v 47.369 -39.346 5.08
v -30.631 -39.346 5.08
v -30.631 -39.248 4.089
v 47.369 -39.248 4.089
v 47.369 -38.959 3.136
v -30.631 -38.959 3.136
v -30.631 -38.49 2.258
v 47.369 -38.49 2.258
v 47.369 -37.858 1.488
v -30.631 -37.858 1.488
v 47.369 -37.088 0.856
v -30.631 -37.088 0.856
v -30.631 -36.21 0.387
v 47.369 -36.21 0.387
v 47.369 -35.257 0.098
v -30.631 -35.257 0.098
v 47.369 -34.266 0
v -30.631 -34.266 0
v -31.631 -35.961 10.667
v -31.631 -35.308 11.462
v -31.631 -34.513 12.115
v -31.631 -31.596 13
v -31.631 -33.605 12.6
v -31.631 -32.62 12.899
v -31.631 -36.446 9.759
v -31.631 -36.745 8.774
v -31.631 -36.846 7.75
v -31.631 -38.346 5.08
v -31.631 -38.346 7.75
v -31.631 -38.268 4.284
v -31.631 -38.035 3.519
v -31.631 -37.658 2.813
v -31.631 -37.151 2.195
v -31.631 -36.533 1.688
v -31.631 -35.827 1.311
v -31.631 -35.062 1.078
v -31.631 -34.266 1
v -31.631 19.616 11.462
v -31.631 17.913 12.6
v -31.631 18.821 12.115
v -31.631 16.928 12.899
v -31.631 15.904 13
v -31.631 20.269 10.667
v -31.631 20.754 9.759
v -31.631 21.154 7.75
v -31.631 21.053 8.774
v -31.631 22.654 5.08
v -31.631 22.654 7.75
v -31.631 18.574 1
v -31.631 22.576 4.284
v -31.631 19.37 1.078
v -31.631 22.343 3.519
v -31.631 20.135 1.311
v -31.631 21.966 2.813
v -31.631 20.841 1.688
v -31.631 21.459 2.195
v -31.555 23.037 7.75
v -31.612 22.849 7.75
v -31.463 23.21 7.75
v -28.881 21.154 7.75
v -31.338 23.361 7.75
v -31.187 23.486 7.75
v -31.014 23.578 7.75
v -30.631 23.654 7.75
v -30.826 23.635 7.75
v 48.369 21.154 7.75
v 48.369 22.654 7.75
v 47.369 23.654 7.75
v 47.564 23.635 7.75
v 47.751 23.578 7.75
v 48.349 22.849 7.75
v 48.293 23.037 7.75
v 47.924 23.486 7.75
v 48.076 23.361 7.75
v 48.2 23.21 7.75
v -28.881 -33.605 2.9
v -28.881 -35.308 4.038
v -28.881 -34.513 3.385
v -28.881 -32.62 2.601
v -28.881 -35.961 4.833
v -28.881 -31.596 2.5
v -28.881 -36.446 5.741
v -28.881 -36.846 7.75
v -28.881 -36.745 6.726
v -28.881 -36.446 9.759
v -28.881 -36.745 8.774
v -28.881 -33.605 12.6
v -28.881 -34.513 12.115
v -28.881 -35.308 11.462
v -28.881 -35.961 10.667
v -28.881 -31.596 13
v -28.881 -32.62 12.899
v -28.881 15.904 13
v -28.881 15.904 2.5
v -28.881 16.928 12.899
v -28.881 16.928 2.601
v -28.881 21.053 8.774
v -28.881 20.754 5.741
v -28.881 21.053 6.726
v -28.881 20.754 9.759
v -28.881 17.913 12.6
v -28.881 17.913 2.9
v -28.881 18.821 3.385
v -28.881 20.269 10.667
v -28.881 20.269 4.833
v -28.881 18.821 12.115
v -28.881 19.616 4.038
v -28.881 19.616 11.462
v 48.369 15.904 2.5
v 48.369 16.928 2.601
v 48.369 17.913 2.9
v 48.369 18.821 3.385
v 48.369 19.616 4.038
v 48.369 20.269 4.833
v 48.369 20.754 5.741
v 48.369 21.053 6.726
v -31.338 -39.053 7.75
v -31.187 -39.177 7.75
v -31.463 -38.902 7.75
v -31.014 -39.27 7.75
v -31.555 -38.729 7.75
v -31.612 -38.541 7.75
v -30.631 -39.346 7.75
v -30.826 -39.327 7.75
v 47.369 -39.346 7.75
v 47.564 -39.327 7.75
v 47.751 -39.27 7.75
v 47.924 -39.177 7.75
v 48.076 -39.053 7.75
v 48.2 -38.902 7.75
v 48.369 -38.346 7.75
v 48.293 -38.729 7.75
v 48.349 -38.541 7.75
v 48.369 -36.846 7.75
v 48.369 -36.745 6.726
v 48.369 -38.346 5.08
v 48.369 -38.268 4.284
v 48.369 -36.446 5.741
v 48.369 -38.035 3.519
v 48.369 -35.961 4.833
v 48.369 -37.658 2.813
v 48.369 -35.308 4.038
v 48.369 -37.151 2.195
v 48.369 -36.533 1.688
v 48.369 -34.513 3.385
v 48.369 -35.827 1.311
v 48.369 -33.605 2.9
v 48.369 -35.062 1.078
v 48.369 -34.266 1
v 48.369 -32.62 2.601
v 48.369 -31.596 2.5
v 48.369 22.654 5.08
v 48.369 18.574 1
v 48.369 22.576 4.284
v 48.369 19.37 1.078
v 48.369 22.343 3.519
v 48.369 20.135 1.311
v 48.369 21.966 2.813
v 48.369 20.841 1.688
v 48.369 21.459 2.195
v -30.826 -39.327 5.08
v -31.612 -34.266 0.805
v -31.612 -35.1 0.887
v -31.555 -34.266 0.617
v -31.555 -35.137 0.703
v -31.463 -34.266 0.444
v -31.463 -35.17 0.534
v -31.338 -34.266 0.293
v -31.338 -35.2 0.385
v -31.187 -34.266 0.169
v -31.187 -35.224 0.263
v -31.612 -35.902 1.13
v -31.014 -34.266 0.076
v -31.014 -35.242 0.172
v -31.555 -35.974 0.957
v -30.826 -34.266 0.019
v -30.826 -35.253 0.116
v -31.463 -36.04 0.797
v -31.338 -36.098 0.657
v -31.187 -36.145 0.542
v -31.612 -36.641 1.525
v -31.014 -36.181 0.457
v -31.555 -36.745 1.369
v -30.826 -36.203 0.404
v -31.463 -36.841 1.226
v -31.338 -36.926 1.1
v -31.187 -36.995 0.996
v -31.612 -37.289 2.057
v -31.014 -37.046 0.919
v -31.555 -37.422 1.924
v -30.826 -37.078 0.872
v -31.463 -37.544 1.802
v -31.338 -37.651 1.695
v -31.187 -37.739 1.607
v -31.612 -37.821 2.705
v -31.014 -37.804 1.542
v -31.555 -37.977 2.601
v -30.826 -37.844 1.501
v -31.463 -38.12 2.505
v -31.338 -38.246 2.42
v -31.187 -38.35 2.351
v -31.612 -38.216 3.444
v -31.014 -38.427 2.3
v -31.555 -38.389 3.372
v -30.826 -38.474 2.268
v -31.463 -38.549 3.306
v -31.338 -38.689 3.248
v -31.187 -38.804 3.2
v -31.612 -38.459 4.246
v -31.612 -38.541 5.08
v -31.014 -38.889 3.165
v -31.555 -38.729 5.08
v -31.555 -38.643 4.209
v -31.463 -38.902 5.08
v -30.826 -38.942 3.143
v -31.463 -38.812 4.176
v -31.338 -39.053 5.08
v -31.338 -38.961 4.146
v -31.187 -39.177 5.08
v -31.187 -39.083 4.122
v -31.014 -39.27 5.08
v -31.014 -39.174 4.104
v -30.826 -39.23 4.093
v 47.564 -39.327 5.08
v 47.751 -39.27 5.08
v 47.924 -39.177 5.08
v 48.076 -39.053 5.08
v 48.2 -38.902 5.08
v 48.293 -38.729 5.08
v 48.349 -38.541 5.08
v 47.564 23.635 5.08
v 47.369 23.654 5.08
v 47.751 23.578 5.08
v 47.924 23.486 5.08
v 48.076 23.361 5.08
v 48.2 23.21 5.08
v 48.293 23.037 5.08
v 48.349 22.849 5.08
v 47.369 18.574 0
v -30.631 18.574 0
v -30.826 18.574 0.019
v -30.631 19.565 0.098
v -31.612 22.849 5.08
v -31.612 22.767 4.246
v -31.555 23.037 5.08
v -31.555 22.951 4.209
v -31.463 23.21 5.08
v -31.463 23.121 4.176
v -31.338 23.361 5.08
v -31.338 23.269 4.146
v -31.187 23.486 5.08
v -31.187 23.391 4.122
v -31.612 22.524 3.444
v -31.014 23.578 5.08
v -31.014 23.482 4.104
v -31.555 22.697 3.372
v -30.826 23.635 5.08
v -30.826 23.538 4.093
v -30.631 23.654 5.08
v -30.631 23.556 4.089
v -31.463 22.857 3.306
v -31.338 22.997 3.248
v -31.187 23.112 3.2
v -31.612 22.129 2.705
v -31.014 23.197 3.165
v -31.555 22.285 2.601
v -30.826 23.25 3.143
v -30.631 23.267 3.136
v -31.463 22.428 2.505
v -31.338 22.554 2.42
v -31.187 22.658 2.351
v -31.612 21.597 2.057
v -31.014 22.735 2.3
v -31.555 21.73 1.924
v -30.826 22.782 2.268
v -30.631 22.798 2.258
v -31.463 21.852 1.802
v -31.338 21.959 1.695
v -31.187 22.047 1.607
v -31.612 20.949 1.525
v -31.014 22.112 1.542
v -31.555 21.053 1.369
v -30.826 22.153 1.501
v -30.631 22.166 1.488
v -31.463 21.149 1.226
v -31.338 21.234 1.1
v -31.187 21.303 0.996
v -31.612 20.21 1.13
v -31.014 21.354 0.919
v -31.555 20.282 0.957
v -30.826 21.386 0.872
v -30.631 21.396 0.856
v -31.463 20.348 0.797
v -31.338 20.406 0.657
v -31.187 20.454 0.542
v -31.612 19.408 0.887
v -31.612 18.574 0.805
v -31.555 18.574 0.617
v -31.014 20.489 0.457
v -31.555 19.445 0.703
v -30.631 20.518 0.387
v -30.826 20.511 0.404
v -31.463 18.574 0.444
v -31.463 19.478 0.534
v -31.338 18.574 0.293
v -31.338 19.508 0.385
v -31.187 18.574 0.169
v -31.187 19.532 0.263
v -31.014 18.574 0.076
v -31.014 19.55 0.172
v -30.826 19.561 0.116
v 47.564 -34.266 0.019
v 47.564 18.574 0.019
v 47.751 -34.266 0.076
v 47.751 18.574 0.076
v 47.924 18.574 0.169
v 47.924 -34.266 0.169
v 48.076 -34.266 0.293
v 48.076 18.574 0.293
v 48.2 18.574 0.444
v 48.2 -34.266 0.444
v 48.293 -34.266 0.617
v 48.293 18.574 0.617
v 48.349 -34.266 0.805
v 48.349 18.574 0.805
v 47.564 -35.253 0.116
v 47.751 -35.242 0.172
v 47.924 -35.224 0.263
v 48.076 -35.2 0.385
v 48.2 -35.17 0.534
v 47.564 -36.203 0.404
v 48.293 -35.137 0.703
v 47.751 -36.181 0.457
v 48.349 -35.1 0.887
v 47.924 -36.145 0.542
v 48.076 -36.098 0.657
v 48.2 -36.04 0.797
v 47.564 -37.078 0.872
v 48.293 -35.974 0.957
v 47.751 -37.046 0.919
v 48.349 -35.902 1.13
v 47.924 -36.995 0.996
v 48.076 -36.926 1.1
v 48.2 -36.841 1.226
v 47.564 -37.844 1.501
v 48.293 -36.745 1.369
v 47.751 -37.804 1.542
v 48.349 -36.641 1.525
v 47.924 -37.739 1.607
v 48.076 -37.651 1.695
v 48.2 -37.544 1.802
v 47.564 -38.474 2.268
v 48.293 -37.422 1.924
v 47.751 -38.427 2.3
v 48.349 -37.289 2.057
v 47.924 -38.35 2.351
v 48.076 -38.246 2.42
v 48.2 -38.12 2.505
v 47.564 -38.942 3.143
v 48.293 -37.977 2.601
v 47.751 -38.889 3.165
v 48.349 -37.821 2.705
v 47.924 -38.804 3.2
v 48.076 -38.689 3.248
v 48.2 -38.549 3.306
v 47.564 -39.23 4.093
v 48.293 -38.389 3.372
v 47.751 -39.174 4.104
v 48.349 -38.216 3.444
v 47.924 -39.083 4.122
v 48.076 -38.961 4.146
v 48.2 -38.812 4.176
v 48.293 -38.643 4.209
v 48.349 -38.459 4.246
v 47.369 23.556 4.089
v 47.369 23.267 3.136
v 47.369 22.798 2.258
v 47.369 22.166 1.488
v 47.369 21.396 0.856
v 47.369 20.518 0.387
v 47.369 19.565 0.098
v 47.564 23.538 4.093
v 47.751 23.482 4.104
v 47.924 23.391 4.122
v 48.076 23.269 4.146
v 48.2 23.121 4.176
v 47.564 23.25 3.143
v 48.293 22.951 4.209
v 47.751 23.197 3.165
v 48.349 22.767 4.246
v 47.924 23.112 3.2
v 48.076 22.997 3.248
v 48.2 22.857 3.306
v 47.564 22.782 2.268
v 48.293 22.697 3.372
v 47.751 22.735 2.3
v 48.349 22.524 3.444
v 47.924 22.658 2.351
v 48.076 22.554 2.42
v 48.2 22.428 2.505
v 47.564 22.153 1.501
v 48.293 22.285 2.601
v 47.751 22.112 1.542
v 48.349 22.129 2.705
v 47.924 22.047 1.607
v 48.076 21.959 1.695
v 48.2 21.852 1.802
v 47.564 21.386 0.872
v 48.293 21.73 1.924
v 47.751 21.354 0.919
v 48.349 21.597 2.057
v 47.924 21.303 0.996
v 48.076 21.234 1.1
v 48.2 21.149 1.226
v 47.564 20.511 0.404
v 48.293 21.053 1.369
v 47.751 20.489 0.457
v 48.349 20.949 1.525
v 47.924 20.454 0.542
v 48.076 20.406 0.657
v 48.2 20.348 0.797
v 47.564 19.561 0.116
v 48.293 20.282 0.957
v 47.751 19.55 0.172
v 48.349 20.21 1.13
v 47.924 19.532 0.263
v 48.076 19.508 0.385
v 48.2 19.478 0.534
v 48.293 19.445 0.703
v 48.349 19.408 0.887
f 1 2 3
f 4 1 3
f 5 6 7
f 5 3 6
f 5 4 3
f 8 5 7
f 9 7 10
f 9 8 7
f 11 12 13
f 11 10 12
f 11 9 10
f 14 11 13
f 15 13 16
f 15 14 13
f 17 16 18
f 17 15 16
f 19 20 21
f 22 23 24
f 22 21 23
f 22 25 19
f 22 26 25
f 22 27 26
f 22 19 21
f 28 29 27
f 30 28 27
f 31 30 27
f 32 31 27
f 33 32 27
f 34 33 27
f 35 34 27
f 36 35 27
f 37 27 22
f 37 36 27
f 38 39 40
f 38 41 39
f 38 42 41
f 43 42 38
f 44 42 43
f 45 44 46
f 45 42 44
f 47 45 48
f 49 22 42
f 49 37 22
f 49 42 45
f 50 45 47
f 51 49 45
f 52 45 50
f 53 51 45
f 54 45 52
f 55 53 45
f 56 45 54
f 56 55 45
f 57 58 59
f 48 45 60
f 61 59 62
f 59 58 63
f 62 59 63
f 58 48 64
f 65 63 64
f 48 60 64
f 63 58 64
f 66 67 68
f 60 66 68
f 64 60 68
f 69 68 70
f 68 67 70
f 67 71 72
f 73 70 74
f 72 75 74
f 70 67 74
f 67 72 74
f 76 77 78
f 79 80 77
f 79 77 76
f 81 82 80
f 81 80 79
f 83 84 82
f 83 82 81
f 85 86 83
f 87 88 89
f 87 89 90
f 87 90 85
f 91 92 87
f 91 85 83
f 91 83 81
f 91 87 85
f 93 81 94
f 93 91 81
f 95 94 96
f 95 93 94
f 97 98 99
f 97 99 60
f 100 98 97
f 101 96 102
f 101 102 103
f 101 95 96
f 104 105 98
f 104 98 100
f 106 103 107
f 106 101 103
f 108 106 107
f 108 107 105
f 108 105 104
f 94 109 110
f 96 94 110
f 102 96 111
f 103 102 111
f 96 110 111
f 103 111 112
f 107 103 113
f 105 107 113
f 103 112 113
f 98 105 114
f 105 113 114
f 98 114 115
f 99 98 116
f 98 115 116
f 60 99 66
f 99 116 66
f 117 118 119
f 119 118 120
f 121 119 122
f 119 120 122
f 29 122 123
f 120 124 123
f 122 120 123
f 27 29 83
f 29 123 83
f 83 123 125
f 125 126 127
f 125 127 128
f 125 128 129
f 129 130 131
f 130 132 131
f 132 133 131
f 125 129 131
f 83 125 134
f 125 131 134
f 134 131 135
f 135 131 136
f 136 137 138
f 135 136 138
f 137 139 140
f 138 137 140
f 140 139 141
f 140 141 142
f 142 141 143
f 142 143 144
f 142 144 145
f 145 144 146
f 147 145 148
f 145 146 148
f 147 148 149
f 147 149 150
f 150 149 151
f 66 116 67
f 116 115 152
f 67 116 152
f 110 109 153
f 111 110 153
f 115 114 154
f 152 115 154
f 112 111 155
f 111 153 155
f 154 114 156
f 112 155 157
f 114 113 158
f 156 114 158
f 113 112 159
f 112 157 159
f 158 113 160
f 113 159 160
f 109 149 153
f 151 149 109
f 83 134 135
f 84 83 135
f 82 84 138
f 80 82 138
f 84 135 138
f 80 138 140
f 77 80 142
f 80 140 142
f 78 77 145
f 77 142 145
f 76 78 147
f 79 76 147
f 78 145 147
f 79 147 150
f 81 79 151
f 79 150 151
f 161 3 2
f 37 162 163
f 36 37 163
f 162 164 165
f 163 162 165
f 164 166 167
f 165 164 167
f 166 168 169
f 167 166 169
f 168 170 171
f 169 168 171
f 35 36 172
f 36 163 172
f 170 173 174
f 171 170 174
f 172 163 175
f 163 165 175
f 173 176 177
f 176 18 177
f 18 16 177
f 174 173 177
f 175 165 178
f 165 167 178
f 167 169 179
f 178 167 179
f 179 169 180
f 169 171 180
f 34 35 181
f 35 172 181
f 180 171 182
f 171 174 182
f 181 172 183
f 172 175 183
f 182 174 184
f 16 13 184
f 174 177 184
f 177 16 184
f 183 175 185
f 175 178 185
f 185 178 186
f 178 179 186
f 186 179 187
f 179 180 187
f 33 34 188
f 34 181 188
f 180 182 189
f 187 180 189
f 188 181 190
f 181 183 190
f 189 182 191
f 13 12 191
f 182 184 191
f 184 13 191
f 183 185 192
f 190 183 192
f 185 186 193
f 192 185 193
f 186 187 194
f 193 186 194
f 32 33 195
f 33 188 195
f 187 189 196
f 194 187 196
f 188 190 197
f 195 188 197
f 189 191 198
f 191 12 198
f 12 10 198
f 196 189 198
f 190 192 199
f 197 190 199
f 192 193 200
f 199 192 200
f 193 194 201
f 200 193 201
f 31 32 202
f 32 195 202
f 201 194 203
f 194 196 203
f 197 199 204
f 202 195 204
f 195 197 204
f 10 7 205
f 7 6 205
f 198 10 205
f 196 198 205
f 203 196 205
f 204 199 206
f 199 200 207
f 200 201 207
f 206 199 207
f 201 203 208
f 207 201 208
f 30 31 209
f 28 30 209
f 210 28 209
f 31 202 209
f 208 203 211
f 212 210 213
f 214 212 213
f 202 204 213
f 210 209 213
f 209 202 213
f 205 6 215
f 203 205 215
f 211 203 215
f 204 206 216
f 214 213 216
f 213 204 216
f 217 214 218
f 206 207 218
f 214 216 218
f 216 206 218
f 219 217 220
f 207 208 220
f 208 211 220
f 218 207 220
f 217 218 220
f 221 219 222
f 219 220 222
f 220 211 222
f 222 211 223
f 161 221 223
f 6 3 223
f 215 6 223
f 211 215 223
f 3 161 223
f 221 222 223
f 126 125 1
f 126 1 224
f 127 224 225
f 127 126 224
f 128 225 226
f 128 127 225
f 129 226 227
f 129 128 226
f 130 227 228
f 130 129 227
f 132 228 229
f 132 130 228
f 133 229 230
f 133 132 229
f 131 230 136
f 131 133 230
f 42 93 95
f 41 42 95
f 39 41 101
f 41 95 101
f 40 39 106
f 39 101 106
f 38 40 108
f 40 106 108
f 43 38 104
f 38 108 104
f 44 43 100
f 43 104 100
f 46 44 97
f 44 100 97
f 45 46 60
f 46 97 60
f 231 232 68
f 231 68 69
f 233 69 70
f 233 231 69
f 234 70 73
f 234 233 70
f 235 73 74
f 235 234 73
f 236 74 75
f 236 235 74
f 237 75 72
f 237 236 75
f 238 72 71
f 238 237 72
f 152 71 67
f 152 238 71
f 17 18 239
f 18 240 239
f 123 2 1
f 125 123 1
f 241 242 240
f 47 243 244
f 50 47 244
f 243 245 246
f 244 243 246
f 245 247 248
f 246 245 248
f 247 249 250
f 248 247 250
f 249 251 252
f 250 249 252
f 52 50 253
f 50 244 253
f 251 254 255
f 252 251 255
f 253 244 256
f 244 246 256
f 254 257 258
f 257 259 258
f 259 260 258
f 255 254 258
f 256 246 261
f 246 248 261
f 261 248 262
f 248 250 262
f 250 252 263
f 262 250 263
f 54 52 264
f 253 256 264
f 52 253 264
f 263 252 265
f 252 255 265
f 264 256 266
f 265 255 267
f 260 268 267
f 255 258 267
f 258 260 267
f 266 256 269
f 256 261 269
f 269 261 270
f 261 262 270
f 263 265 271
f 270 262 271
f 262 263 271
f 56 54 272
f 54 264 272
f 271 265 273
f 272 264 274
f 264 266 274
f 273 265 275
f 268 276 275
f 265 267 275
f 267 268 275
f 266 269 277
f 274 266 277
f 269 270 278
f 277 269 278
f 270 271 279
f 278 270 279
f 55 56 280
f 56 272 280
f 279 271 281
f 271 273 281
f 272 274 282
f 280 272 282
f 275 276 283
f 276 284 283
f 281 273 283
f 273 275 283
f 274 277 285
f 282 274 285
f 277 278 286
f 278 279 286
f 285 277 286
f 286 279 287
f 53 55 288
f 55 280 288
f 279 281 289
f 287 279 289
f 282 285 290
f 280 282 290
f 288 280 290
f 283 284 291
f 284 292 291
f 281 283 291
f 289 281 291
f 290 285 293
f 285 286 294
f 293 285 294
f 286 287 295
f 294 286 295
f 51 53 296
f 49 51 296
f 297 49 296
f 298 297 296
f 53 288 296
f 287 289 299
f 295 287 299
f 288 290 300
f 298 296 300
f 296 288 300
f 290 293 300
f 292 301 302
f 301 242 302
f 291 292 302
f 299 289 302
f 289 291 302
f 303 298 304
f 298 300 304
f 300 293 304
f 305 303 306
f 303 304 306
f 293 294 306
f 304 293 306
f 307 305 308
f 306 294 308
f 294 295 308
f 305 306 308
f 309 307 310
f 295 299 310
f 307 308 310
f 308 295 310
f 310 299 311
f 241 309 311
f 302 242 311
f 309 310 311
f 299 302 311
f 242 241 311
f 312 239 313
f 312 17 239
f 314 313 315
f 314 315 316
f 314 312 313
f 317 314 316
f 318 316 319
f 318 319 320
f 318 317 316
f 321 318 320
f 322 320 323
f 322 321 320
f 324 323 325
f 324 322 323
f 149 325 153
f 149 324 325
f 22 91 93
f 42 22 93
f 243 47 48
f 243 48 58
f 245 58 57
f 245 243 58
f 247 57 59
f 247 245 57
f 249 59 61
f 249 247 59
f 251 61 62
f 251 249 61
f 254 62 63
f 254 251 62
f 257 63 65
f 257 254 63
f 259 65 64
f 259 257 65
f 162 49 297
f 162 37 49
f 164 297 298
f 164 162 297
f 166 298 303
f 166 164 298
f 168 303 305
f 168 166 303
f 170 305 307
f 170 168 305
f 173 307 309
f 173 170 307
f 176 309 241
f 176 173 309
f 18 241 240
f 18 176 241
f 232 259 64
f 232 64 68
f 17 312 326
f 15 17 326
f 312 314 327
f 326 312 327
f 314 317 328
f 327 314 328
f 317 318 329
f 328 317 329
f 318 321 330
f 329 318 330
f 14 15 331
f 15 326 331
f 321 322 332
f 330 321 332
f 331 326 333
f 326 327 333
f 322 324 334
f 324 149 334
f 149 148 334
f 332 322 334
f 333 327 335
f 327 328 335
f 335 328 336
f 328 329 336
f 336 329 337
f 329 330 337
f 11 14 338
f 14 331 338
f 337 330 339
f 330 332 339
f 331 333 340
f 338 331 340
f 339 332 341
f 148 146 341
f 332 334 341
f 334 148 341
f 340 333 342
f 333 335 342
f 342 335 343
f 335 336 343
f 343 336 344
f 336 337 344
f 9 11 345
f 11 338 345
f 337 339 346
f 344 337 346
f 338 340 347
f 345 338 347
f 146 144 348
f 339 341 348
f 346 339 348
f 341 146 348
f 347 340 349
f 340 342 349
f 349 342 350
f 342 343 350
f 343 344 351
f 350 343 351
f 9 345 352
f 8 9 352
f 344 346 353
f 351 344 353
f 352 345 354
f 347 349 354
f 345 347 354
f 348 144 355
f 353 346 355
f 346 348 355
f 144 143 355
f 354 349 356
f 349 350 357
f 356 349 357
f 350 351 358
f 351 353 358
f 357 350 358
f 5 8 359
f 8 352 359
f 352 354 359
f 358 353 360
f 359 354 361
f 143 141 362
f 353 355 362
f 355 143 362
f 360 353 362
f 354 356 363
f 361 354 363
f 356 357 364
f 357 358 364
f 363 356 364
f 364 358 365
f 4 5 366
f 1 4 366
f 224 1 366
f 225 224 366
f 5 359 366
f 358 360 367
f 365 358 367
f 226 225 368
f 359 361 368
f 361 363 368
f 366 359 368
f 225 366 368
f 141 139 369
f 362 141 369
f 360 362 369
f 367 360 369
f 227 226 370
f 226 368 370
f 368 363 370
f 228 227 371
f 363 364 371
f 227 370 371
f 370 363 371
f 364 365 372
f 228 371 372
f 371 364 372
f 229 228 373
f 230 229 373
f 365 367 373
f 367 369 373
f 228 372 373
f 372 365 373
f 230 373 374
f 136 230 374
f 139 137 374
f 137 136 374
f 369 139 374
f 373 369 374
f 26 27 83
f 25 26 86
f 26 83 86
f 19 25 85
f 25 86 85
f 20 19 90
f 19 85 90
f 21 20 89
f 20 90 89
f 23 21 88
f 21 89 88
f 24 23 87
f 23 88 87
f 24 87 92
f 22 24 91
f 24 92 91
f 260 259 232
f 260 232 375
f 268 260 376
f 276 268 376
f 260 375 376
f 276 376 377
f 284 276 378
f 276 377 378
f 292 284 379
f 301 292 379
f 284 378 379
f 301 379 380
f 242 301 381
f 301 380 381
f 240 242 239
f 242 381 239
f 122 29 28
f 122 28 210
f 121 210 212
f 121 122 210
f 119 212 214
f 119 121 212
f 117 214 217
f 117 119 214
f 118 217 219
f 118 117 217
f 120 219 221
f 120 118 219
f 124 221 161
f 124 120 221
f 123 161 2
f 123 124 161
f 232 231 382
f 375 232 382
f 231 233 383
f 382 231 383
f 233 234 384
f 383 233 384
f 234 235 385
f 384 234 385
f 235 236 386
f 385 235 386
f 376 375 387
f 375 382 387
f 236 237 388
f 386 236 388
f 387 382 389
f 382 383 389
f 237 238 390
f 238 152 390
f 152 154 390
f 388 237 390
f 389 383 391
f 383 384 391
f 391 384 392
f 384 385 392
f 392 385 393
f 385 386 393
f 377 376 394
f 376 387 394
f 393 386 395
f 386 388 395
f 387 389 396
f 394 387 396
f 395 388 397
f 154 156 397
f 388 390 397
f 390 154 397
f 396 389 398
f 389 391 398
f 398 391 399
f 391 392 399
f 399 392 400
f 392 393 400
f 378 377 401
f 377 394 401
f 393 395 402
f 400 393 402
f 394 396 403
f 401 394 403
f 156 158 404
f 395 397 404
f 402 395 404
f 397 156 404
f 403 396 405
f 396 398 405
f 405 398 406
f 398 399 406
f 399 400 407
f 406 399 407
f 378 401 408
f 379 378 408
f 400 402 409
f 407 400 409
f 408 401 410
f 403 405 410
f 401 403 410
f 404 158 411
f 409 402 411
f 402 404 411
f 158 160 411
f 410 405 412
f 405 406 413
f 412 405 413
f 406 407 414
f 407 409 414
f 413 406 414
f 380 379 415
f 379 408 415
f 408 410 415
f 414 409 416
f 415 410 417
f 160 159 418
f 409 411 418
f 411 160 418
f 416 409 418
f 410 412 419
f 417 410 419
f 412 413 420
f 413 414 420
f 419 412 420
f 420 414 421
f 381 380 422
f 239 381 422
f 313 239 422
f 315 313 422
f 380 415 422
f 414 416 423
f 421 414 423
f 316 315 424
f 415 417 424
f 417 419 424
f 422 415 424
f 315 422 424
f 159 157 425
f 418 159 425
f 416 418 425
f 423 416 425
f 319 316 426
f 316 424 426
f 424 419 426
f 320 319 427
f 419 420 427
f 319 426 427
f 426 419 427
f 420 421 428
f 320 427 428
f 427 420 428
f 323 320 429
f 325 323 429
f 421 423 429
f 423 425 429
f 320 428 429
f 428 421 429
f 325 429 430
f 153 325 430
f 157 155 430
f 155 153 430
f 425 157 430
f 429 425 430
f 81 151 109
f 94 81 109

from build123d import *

# Parameters (mm, degrees)
F0_W     = 80
F0_H     = 63
F1_DEPTH = 15.5
F3_DEPTH = 77.25
F4_R     = 5.08
F5_R     = 1
F6_DEPTH = 98.552


with BuildPart() as f1:
    # F0 (on Top) → F1 (new body)
    with BuildSketch(Plane.XY):
        with Locations((8.368649, -7.845957)):
            Rectangle(F0_W, F0_H)
    extrude(amount=F1_DEPTH)

    # F2 (on face) → F3 (cut)
    with BuildSketch(Plane.YZ.offset(48.368649)):
        with BuildLine():
            Line((-31.595957, 2.5), (-7.845957, 2.5))
            Line((-7.845957, 2.5), (15.904043, 2.5))
            ThreePointArc((15.904043, 2.5), (19.616353, 4.037689), (21.154043, 7.75))
            ThreePointArc((21.154043, 7.75), (19.616353, 11.462311), (15.904043, 13))
            Line((15.904043, 13), (-7.845957, 13))
            Line((-7.845957, 13), (-31.595957, 13))
            ThreePointArc((-31.595957, 13), (-35.308268, 11.462311), (-36.845957, 7.75))
            ThreePointArc((-36.845957, 7.75), (-35.308268, 4.037689), (-31.595957, 2.5))
        make_face()
    extrude(amount=-F3_DEPTH, mode=Mode.SUBTRACT)

    # F4
    f4_edges = [f1.edges().sort_by_distance(p)[0] for p in [
        (8.368649, -39.345957, 15.5),
        (8.368649, -39.345957, 0),
        (8.368649, 23.654043, 15.5),
        (8.368649, 23.654043, 0),
    ]]
    fillet(f4_edges, radius=F4_R)

    # F5
    f5_edges = [f1.edges().sort_by_distance(p)[0] for p in [
        (-31.631351, -7.845957, 15.5),
        (48.368649, -7.845957, 15.5),
    ]]
    fillet(f5_edges, radius=F5_R)

    # F2 (on face) → F6 (cut)
    with BuildSketch(Plane.YZ.offset(48.368649)):
        with BuildLine():
            ThreePointArc((15.904043, 13), (19.616353, 11.462311), (21.154043, 7.75))
            Line((21.154043, 7.75), (23.654043, 7.75))
            Line((23.654043, 7.75), (23.654043, 15.5))
            Line((23.654043, 15.5), (-39.345957, 15.5))
            Line((-39.345957, 15.5), (-39.345957, 7.75))
            Line((-39.345957, 7.75), (-36.845957, 7.75))
            ThreePointArc((-36.845957, 7.75), (-35.308268, 11.462311), (-31.595957, 13))
            Line((-31.595957, 13), (-7.845957, 13))
            Line((-7.845957, 13), (15.904043, 13))
        make_face()
    extrude(amount=-F6_DEPTH, mode=Mode.SUBTRACT)


solid = f1.part
